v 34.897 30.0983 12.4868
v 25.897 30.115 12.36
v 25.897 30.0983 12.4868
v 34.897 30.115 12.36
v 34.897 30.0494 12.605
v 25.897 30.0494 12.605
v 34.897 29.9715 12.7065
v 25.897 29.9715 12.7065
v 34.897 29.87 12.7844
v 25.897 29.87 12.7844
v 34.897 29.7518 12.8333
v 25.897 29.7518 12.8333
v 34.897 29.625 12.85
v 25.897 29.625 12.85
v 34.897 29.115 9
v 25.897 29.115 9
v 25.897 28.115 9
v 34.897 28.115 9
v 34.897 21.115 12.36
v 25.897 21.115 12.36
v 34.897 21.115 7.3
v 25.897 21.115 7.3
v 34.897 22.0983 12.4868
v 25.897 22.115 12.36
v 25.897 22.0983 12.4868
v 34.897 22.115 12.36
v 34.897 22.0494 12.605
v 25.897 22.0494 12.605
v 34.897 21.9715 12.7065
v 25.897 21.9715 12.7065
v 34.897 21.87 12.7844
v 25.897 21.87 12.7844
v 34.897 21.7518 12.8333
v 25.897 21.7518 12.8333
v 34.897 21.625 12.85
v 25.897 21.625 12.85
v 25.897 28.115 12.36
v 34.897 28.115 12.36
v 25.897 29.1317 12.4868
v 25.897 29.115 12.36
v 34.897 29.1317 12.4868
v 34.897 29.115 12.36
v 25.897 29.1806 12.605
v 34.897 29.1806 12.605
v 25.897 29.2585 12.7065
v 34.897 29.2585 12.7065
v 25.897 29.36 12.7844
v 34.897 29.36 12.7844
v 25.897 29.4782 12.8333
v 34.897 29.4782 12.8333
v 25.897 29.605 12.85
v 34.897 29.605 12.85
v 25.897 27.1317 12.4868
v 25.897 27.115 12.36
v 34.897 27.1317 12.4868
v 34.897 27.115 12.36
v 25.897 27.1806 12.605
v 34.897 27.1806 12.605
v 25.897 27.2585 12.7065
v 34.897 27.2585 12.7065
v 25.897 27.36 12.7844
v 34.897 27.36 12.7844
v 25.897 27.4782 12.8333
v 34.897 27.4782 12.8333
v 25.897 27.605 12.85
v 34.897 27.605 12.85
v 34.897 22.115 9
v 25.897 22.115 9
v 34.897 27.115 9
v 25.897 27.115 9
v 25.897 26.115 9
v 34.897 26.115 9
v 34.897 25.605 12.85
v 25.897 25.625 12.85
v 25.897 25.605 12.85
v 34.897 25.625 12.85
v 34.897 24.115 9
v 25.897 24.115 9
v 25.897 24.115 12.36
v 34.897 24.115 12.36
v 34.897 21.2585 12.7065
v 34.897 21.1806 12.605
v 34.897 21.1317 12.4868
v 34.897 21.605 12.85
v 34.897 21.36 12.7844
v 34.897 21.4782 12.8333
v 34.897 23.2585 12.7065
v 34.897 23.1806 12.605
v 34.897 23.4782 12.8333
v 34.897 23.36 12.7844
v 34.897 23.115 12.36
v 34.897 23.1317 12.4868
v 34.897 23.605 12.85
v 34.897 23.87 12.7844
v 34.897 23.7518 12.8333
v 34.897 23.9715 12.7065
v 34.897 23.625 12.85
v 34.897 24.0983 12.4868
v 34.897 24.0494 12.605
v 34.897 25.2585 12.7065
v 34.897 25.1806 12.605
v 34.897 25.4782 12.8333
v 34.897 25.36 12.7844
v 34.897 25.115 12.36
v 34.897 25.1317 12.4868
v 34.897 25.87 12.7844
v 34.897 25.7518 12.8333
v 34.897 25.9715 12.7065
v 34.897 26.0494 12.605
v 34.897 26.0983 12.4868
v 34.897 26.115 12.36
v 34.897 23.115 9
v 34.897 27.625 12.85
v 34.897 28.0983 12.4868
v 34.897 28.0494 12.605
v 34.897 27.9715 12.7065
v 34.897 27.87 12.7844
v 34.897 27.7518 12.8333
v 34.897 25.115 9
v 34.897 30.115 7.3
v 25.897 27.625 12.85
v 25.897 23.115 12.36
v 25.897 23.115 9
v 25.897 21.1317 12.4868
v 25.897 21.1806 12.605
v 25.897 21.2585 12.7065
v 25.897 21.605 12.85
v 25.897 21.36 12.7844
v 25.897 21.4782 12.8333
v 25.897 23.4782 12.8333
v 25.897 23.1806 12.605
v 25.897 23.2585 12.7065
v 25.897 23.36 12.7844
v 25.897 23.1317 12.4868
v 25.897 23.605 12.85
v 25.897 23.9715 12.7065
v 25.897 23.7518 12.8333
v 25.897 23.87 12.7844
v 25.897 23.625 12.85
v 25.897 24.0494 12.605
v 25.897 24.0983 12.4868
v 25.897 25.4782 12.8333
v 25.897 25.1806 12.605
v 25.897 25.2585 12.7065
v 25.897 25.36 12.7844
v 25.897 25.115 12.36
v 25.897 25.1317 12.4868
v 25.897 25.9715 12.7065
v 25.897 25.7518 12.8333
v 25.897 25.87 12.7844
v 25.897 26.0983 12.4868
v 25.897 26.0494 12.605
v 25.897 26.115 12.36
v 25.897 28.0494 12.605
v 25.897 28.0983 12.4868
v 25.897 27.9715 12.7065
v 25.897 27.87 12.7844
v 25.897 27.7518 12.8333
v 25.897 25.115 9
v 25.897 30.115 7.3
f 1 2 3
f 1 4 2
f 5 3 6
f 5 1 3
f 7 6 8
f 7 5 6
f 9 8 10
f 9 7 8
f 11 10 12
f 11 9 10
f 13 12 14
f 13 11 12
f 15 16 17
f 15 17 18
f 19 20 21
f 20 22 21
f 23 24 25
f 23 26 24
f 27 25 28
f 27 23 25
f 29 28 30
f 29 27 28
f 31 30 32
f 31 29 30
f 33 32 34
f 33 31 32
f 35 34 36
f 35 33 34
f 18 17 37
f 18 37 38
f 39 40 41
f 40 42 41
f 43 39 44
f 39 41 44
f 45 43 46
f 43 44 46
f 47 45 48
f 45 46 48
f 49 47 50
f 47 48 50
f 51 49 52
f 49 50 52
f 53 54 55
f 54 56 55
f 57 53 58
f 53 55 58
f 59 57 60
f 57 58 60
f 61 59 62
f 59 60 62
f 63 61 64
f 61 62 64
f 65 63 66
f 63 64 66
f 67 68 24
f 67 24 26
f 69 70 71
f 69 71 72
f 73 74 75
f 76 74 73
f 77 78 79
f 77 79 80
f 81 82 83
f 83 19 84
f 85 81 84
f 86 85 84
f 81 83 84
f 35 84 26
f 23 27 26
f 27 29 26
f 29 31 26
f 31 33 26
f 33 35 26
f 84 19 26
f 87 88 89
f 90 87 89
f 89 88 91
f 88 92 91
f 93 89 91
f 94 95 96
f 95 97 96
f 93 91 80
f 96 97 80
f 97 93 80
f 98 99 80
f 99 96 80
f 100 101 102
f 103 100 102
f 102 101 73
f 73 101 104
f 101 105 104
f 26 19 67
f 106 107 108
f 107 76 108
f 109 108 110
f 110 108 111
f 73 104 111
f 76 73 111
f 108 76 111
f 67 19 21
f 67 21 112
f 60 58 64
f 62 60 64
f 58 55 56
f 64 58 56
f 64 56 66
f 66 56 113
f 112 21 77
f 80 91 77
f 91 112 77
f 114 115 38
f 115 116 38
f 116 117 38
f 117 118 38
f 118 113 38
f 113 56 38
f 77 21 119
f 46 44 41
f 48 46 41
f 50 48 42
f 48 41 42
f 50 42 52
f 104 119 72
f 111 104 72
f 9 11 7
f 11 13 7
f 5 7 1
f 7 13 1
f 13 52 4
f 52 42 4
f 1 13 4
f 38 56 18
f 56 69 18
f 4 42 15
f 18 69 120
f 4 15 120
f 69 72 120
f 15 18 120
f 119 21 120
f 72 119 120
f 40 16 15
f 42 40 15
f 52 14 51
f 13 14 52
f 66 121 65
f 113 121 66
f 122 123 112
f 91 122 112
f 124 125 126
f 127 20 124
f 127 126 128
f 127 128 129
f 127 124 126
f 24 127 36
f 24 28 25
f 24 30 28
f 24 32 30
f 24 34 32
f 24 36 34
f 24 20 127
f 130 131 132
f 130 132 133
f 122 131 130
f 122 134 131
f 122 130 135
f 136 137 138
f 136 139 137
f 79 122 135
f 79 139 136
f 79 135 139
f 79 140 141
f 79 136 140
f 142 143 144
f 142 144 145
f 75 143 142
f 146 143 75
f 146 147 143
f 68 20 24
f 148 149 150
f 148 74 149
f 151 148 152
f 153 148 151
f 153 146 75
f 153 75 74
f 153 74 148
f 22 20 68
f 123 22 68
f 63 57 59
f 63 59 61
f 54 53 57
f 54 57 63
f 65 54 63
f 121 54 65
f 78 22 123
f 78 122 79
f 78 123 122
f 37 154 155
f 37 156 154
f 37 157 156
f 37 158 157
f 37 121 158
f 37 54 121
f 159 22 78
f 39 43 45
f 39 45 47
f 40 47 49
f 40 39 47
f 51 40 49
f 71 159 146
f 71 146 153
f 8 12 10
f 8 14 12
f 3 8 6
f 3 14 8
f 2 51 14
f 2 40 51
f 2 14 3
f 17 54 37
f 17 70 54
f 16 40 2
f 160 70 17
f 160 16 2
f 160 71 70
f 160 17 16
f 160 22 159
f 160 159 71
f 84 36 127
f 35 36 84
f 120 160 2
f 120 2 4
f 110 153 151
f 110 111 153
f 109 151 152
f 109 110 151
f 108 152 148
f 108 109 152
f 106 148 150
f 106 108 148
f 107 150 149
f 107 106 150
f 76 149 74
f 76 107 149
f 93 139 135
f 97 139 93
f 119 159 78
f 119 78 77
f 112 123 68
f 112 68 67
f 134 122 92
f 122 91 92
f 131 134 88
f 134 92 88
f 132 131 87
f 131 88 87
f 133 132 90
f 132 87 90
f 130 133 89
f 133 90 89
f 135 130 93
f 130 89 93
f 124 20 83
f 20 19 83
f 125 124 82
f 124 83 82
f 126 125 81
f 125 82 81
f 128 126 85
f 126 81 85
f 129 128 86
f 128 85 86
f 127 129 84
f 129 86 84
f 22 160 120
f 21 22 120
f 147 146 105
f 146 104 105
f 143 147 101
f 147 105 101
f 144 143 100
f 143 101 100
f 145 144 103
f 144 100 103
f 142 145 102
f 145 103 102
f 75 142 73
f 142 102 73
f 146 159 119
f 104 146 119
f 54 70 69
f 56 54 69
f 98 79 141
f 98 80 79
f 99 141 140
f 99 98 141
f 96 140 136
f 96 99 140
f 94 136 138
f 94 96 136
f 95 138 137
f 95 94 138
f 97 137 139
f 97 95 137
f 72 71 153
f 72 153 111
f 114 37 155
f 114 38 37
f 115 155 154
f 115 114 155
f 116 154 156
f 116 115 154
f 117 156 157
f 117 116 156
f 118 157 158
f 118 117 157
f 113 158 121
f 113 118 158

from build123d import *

# Parameters (mm, degrees)
BOX085026_W          = 9
BOX085026_H          = 1
BOX085026_DEPTH      = 3.85
FILLET005011017017_R = 0.49
BOX085027_W          = 9
BOX085027_H          = 1
BOX085027_DEPTH      = 3.85
FILLET005011017018_R = 0.49
BOX085028_W          = 9
BOX085028_H          = 1
BOX085028_DEPTH      = 3.85
FILLET005011017019_R = 0.49
BOX085029_W          = 9
BOX085029_H          = 1
BOX085029_DEPTH      = 3.85
FILLET005011017020_R = 0.49
BOX085030_W          = 9
BOX085030_H          = 1
BOX085030_DEPTH      = 3.85
FILLET005011017021_R = 0.49
BOX085025_W          = 9
BOX085025_H          = 9
BOX085025_DEPTH      = 1.7


with BuildPart() as fillet005011017017:
    # Box085026 → Box085026 (new body)
    with BuildSketch(Plane(origin=(25.897, 21.115, 10), x_dir=(1, 0, 0), z_dir=(0, 0, 1))):
        with Locations((4.5, 0.5)):
            Rectangle(BOX085026_W, BOX085026_H)
    extrude(amount=BOX085026_DEPTH)

    # Fillet005011017017
    fillet005011017017_edges = [fillet005011017017.edges().sort_by_distance(p)[0] for p in [
        (30.397, 21.115, 13.85),
        (30.397, 22.115, 13.85),
    ]]
    fillet(fillet005011017017_edges, radius=FILLET005011017017_R)


with BuildPart() as fillet005011017018:
    # Box085027 → Box085027 (new body)
    with BuildSketch(Plane(origin=(25.897, 21.115, 10), x_dir=(1, 0, 0), z_dir=(0, 0, 1))):
        with Locations((4.5, 0.5)):
            Rectangle(BOX085027_W, BOX085027_H)
    extrude(amount=BOX085027_DEPTH)

    # Fillet005011017018
    fillet005011017018_edges = [fillet005011017018.edges().sort_by_distance(p)[0] for p in [
        (30.397, 21.115, 13.85),
        (30.397, 22.115, 13.85),
    ]]
    fillet(fillet005011017018_edges, radius=FILLET005011017018_R)


with BuildPart() as fillet005011017018_1:
    # Fillet005011017018 placement: moved
    add(fillet005011017018.part.moved(Location((0, 2, 0))))


with BuildPart() as fillet005011017019:
    # Box085028 → Box085028 (new body)
    with BuildSketch(Plane(origin=(25.897, 21.115, 10), x_dir=(1, 0, 0), z_dir=(0, 0, 1))):
        with Locations((4.5, 0.5)):
            Rectangle(BOX085028_W, BOX085028_H)
    extrude(amount=BOX085028_DEPTH)

    # Fillet005011017019
    fillet005011017019_edges = [fillet005011017019.edges().sort_by_distance(p)[0] for p in [
        (30.397, 21.115, 13.85),
        (30.397, 22.115, 13.85),
    ]]
    fillet(fillet005011017019_edges, radius=FILLET005011017019_R)


with BuildPart() as fillet005011017019_1:
    # Fillet005011017019 placement: moved
    add(fillet005011017019.part.moved(Location((0, 4, 0))))


with BuildPart() as fillet005011017020:
    # Box085029 → Box085029 (new body)
    with BuildSketch(Plane(origin=(25.897, 21.115, 10), x_dir=(1, 0, 0), z_dir=(0, 0, 1))):
        with Locations((4.5, 0.5)):
            Rectangle(BOX085029_W, BOX085029_H)
    extrude(amount=BOX085029_DEPTH)

    # Fillet005011017020
    fillet005011017020_edges = [fillet005011017020.edges().sort_by_distance(p)[0] for p in [
        (30.397, 21.115, 13.85),
        (30.397, 22.115, 13.85),
    ]]
    fillet(fillet005011017020_edges, radius=FILLET005011017020_R)


with BuildPart() as fillet005011017020_1:
    # Fillet005011017020 placement: moved
    add(fillet005011017020.part.moved(Location((0, 6, 0))))


with BuildPart() as fillet005011017021:
    # Box085030 → Box085030 (new body)
    with BuildSketch(Plane(origin=(25.897, 21.115, 10), x_dir=(1, 0, 0), z_dir=(0, 0, 1))):
        with Locations((4.5, 0.5)):
            Rectangle(BOX085030_W, BOX085030_H)
    extrude(amount=BOX085030_DEPTH)

    # Fillet005011017021
    fillet005011017021_edges = [fillet005011017021.edges().sort_by_distance(p)[0] for p in [
        (30.397, 21.115, 13.85),
        (30.397, 22.115, 13.85),
    ]]
    fillet(fillet005011017021_edges, radius=FILLET005011017021_R)


with BuildPart() as fillet005011017021_1:
    # Fillet005011017021 placement: moved
    add(fillet005011017021.part.moved(Location((0, 8, 0))))


with BuildPart() as rpi_lan_heatsink:
    # Box085025 → Box085025 (new body)
    with BuildSketch(Plane(origin=(25.897, 21.115, 8.3), x_dir=(1, 0, 0), z_dir=(0, 0, 1))):
        with Locations((4.5, 4.5)):
            Rectangle(BOX085025_W, BOX085025_H)
    extrude(amount=BOX085025_DEPTH)

    # Fusion004008002002002001007002002014: union Fillet005011017017, Fillet005011017018, Fillet005011017019, Fillet005011017020, Fillet005011017021
    add(fillet005011017017.part)
    add(fillet005011017018_1.part)
    add(fillet005011017019_1.part)
    add(fillet005011017020_1.part)
    add(fillet005011017021_1.part)


with BuildPart() as rpi_lan_heatsink_1:
    # Fusion004008002002002001007002002014 placement: moved
    add(rpi_lan_heatsink.part.moved(Location((0, 0, -1))))


solid = rpi_lan_heatsink_1.part
